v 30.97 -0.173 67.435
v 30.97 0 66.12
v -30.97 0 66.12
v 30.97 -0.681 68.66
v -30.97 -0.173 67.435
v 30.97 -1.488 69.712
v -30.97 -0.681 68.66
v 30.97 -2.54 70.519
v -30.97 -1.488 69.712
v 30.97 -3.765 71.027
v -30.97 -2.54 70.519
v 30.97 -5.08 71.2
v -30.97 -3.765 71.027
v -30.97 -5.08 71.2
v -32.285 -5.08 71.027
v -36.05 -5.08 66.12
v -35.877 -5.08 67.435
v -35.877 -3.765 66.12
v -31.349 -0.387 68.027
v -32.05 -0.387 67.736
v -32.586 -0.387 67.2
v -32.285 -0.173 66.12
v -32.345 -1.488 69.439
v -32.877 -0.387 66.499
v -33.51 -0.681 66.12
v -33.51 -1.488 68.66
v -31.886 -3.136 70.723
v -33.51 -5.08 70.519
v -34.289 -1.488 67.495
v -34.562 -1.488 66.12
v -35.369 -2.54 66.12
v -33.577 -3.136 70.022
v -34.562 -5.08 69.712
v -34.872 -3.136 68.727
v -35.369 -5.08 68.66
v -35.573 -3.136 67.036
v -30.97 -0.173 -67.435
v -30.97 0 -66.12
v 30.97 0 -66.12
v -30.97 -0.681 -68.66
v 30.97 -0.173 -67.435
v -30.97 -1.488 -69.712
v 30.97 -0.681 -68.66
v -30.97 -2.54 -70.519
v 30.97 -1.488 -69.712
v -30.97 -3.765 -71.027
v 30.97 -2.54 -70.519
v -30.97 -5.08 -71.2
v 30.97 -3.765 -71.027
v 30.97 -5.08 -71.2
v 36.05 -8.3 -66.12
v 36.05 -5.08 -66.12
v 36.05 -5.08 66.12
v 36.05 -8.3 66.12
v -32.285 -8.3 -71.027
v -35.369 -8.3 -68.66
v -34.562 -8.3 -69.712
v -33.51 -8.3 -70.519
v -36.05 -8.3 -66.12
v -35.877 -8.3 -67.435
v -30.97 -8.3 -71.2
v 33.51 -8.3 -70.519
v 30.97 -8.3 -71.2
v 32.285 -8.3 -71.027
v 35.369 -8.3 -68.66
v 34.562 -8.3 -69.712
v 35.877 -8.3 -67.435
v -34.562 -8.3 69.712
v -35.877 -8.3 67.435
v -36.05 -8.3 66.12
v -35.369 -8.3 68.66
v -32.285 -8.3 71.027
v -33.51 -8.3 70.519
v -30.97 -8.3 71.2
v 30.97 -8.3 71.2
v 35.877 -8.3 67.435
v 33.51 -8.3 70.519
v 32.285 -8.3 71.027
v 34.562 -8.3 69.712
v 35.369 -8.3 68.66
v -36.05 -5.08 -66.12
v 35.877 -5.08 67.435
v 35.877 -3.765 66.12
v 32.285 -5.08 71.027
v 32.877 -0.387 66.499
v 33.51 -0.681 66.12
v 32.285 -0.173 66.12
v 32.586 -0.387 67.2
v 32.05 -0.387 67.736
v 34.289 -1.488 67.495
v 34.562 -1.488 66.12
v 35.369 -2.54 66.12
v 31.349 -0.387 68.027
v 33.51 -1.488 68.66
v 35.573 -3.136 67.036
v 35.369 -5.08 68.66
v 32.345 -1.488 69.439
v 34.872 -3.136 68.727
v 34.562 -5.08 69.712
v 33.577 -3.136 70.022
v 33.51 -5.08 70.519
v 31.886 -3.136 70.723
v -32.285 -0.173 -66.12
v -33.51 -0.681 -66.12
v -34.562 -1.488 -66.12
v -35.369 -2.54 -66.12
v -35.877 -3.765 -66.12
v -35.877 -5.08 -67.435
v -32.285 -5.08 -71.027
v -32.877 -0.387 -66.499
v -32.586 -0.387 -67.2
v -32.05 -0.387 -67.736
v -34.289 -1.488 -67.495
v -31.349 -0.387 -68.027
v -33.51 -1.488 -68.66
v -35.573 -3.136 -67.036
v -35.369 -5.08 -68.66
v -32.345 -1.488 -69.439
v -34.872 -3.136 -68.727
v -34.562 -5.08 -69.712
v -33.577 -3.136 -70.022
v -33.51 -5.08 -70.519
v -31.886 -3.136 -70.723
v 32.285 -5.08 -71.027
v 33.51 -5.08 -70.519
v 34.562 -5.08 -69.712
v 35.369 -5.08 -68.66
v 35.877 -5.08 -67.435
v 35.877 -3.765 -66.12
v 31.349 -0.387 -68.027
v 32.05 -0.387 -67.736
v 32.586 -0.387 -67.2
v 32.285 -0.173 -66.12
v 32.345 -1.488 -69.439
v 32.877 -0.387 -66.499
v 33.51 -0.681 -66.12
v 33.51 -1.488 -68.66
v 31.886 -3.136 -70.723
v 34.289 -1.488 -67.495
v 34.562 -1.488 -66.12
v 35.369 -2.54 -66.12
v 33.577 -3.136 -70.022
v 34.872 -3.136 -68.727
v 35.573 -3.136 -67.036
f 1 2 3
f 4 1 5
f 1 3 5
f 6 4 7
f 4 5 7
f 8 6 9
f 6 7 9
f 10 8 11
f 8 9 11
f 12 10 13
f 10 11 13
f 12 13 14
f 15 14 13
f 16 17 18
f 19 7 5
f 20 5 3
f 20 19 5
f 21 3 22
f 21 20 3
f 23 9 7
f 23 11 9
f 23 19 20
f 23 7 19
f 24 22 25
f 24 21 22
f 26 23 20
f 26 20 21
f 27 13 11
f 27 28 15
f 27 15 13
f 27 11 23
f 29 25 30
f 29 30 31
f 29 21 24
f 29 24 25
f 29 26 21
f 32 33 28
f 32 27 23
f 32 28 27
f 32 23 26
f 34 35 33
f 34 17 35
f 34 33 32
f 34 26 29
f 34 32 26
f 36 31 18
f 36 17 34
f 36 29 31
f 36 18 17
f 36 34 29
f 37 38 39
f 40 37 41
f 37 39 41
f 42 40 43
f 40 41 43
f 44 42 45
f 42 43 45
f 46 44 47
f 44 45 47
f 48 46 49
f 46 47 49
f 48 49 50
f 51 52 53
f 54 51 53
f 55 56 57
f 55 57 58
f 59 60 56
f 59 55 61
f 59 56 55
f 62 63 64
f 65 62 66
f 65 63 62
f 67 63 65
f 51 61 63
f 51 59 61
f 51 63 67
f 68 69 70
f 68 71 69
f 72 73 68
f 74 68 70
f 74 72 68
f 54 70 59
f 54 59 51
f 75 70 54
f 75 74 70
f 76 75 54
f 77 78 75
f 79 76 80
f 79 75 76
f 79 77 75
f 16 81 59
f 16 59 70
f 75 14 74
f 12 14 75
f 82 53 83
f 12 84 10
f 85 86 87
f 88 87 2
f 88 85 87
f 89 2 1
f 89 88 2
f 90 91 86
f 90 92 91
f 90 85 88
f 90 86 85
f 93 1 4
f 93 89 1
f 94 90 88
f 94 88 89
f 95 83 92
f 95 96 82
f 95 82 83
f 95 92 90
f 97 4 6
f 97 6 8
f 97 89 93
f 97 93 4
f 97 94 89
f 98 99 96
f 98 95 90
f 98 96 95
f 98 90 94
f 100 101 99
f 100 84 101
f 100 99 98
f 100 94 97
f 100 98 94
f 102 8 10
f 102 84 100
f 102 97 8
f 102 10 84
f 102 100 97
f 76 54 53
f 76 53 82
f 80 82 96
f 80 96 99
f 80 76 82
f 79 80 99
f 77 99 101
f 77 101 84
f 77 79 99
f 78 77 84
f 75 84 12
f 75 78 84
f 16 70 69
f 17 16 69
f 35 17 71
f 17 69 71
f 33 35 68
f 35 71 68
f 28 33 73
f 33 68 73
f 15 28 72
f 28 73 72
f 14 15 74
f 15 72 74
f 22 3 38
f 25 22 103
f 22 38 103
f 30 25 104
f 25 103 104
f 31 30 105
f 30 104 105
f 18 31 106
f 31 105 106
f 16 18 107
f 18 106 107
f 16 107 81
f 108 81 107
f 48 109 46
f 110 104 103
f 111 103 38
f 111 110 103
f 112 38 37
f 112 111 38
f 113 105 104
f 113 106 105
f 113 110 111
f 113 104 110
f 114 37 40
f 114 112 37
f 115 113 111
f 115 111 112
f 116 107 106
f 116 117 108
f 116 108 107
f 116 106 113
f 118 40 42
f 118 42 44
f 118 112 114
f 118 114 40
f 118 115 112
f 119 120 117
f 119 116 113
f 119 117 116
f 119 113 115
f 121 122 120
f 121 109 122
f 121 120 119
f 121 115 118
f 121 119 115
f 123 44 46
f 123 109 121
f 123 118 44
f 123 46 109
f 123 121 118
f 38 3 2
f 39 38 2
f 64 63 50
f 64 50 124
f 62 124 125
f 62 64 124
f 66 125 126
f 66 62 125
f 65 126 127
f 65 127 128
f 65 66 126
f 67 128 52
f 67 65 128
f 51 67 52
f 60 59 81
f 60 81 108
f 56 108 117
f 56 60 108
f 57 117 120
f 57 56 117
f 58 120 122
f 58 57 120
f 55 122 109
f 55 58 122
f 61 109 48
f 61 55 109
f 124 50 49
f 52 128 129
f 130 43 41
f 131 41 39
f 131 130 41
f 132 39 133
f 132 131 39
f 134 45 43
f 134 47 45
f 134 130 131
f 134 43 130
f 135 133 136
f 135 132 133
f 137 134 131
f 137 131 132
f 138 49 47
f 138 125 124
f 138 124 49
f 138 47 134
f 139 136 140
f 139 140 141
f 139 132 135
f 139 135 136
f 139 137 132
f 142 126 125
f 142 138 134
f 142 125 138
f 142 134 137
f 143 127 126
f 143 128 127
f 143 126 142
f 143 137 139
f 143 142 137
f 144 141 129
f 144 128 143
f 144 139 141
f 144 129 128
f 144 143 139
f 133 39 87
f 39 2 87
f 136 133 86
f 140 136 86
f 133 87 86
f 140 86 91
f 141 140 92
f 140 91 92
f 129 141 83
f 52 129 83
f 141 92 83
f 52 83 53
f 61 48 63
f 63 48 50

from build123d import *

# Parameters (mm, degrees)
F0_W     = 72.1
F0_H     = 142.4
F1_DEPTH = 8.3
F2_R     = 5.08
F3_R     = 5.08


with BuildPart() as f1:
    # F0 (on Front) → F1 (new body)
    with BuildSketch(Plane.XZ):
        Rectangle(F0_W, F0_H)
    extrude(amount=F1_DEPTH)

    # F2
    f2_edges = [f1.edges().sort_by_distance(p)[0] for p in [
        (-36.05, -4.15, 71.2),
        (36.05, -4.15, 71.2),
        (36.05, -4.15, -71.2),
        (-36.05, -4.15, -71.2),
    ]]
    fillet(f2_edges, radius=F2_R)

    # F3
    f3_edges = [f1.edges().sort_by_distance(p)[0] for p in [
        (36.05, 0, 0),
    ]]
    fillet(f3_edges, radius=F3_R)


solid = f1.part
